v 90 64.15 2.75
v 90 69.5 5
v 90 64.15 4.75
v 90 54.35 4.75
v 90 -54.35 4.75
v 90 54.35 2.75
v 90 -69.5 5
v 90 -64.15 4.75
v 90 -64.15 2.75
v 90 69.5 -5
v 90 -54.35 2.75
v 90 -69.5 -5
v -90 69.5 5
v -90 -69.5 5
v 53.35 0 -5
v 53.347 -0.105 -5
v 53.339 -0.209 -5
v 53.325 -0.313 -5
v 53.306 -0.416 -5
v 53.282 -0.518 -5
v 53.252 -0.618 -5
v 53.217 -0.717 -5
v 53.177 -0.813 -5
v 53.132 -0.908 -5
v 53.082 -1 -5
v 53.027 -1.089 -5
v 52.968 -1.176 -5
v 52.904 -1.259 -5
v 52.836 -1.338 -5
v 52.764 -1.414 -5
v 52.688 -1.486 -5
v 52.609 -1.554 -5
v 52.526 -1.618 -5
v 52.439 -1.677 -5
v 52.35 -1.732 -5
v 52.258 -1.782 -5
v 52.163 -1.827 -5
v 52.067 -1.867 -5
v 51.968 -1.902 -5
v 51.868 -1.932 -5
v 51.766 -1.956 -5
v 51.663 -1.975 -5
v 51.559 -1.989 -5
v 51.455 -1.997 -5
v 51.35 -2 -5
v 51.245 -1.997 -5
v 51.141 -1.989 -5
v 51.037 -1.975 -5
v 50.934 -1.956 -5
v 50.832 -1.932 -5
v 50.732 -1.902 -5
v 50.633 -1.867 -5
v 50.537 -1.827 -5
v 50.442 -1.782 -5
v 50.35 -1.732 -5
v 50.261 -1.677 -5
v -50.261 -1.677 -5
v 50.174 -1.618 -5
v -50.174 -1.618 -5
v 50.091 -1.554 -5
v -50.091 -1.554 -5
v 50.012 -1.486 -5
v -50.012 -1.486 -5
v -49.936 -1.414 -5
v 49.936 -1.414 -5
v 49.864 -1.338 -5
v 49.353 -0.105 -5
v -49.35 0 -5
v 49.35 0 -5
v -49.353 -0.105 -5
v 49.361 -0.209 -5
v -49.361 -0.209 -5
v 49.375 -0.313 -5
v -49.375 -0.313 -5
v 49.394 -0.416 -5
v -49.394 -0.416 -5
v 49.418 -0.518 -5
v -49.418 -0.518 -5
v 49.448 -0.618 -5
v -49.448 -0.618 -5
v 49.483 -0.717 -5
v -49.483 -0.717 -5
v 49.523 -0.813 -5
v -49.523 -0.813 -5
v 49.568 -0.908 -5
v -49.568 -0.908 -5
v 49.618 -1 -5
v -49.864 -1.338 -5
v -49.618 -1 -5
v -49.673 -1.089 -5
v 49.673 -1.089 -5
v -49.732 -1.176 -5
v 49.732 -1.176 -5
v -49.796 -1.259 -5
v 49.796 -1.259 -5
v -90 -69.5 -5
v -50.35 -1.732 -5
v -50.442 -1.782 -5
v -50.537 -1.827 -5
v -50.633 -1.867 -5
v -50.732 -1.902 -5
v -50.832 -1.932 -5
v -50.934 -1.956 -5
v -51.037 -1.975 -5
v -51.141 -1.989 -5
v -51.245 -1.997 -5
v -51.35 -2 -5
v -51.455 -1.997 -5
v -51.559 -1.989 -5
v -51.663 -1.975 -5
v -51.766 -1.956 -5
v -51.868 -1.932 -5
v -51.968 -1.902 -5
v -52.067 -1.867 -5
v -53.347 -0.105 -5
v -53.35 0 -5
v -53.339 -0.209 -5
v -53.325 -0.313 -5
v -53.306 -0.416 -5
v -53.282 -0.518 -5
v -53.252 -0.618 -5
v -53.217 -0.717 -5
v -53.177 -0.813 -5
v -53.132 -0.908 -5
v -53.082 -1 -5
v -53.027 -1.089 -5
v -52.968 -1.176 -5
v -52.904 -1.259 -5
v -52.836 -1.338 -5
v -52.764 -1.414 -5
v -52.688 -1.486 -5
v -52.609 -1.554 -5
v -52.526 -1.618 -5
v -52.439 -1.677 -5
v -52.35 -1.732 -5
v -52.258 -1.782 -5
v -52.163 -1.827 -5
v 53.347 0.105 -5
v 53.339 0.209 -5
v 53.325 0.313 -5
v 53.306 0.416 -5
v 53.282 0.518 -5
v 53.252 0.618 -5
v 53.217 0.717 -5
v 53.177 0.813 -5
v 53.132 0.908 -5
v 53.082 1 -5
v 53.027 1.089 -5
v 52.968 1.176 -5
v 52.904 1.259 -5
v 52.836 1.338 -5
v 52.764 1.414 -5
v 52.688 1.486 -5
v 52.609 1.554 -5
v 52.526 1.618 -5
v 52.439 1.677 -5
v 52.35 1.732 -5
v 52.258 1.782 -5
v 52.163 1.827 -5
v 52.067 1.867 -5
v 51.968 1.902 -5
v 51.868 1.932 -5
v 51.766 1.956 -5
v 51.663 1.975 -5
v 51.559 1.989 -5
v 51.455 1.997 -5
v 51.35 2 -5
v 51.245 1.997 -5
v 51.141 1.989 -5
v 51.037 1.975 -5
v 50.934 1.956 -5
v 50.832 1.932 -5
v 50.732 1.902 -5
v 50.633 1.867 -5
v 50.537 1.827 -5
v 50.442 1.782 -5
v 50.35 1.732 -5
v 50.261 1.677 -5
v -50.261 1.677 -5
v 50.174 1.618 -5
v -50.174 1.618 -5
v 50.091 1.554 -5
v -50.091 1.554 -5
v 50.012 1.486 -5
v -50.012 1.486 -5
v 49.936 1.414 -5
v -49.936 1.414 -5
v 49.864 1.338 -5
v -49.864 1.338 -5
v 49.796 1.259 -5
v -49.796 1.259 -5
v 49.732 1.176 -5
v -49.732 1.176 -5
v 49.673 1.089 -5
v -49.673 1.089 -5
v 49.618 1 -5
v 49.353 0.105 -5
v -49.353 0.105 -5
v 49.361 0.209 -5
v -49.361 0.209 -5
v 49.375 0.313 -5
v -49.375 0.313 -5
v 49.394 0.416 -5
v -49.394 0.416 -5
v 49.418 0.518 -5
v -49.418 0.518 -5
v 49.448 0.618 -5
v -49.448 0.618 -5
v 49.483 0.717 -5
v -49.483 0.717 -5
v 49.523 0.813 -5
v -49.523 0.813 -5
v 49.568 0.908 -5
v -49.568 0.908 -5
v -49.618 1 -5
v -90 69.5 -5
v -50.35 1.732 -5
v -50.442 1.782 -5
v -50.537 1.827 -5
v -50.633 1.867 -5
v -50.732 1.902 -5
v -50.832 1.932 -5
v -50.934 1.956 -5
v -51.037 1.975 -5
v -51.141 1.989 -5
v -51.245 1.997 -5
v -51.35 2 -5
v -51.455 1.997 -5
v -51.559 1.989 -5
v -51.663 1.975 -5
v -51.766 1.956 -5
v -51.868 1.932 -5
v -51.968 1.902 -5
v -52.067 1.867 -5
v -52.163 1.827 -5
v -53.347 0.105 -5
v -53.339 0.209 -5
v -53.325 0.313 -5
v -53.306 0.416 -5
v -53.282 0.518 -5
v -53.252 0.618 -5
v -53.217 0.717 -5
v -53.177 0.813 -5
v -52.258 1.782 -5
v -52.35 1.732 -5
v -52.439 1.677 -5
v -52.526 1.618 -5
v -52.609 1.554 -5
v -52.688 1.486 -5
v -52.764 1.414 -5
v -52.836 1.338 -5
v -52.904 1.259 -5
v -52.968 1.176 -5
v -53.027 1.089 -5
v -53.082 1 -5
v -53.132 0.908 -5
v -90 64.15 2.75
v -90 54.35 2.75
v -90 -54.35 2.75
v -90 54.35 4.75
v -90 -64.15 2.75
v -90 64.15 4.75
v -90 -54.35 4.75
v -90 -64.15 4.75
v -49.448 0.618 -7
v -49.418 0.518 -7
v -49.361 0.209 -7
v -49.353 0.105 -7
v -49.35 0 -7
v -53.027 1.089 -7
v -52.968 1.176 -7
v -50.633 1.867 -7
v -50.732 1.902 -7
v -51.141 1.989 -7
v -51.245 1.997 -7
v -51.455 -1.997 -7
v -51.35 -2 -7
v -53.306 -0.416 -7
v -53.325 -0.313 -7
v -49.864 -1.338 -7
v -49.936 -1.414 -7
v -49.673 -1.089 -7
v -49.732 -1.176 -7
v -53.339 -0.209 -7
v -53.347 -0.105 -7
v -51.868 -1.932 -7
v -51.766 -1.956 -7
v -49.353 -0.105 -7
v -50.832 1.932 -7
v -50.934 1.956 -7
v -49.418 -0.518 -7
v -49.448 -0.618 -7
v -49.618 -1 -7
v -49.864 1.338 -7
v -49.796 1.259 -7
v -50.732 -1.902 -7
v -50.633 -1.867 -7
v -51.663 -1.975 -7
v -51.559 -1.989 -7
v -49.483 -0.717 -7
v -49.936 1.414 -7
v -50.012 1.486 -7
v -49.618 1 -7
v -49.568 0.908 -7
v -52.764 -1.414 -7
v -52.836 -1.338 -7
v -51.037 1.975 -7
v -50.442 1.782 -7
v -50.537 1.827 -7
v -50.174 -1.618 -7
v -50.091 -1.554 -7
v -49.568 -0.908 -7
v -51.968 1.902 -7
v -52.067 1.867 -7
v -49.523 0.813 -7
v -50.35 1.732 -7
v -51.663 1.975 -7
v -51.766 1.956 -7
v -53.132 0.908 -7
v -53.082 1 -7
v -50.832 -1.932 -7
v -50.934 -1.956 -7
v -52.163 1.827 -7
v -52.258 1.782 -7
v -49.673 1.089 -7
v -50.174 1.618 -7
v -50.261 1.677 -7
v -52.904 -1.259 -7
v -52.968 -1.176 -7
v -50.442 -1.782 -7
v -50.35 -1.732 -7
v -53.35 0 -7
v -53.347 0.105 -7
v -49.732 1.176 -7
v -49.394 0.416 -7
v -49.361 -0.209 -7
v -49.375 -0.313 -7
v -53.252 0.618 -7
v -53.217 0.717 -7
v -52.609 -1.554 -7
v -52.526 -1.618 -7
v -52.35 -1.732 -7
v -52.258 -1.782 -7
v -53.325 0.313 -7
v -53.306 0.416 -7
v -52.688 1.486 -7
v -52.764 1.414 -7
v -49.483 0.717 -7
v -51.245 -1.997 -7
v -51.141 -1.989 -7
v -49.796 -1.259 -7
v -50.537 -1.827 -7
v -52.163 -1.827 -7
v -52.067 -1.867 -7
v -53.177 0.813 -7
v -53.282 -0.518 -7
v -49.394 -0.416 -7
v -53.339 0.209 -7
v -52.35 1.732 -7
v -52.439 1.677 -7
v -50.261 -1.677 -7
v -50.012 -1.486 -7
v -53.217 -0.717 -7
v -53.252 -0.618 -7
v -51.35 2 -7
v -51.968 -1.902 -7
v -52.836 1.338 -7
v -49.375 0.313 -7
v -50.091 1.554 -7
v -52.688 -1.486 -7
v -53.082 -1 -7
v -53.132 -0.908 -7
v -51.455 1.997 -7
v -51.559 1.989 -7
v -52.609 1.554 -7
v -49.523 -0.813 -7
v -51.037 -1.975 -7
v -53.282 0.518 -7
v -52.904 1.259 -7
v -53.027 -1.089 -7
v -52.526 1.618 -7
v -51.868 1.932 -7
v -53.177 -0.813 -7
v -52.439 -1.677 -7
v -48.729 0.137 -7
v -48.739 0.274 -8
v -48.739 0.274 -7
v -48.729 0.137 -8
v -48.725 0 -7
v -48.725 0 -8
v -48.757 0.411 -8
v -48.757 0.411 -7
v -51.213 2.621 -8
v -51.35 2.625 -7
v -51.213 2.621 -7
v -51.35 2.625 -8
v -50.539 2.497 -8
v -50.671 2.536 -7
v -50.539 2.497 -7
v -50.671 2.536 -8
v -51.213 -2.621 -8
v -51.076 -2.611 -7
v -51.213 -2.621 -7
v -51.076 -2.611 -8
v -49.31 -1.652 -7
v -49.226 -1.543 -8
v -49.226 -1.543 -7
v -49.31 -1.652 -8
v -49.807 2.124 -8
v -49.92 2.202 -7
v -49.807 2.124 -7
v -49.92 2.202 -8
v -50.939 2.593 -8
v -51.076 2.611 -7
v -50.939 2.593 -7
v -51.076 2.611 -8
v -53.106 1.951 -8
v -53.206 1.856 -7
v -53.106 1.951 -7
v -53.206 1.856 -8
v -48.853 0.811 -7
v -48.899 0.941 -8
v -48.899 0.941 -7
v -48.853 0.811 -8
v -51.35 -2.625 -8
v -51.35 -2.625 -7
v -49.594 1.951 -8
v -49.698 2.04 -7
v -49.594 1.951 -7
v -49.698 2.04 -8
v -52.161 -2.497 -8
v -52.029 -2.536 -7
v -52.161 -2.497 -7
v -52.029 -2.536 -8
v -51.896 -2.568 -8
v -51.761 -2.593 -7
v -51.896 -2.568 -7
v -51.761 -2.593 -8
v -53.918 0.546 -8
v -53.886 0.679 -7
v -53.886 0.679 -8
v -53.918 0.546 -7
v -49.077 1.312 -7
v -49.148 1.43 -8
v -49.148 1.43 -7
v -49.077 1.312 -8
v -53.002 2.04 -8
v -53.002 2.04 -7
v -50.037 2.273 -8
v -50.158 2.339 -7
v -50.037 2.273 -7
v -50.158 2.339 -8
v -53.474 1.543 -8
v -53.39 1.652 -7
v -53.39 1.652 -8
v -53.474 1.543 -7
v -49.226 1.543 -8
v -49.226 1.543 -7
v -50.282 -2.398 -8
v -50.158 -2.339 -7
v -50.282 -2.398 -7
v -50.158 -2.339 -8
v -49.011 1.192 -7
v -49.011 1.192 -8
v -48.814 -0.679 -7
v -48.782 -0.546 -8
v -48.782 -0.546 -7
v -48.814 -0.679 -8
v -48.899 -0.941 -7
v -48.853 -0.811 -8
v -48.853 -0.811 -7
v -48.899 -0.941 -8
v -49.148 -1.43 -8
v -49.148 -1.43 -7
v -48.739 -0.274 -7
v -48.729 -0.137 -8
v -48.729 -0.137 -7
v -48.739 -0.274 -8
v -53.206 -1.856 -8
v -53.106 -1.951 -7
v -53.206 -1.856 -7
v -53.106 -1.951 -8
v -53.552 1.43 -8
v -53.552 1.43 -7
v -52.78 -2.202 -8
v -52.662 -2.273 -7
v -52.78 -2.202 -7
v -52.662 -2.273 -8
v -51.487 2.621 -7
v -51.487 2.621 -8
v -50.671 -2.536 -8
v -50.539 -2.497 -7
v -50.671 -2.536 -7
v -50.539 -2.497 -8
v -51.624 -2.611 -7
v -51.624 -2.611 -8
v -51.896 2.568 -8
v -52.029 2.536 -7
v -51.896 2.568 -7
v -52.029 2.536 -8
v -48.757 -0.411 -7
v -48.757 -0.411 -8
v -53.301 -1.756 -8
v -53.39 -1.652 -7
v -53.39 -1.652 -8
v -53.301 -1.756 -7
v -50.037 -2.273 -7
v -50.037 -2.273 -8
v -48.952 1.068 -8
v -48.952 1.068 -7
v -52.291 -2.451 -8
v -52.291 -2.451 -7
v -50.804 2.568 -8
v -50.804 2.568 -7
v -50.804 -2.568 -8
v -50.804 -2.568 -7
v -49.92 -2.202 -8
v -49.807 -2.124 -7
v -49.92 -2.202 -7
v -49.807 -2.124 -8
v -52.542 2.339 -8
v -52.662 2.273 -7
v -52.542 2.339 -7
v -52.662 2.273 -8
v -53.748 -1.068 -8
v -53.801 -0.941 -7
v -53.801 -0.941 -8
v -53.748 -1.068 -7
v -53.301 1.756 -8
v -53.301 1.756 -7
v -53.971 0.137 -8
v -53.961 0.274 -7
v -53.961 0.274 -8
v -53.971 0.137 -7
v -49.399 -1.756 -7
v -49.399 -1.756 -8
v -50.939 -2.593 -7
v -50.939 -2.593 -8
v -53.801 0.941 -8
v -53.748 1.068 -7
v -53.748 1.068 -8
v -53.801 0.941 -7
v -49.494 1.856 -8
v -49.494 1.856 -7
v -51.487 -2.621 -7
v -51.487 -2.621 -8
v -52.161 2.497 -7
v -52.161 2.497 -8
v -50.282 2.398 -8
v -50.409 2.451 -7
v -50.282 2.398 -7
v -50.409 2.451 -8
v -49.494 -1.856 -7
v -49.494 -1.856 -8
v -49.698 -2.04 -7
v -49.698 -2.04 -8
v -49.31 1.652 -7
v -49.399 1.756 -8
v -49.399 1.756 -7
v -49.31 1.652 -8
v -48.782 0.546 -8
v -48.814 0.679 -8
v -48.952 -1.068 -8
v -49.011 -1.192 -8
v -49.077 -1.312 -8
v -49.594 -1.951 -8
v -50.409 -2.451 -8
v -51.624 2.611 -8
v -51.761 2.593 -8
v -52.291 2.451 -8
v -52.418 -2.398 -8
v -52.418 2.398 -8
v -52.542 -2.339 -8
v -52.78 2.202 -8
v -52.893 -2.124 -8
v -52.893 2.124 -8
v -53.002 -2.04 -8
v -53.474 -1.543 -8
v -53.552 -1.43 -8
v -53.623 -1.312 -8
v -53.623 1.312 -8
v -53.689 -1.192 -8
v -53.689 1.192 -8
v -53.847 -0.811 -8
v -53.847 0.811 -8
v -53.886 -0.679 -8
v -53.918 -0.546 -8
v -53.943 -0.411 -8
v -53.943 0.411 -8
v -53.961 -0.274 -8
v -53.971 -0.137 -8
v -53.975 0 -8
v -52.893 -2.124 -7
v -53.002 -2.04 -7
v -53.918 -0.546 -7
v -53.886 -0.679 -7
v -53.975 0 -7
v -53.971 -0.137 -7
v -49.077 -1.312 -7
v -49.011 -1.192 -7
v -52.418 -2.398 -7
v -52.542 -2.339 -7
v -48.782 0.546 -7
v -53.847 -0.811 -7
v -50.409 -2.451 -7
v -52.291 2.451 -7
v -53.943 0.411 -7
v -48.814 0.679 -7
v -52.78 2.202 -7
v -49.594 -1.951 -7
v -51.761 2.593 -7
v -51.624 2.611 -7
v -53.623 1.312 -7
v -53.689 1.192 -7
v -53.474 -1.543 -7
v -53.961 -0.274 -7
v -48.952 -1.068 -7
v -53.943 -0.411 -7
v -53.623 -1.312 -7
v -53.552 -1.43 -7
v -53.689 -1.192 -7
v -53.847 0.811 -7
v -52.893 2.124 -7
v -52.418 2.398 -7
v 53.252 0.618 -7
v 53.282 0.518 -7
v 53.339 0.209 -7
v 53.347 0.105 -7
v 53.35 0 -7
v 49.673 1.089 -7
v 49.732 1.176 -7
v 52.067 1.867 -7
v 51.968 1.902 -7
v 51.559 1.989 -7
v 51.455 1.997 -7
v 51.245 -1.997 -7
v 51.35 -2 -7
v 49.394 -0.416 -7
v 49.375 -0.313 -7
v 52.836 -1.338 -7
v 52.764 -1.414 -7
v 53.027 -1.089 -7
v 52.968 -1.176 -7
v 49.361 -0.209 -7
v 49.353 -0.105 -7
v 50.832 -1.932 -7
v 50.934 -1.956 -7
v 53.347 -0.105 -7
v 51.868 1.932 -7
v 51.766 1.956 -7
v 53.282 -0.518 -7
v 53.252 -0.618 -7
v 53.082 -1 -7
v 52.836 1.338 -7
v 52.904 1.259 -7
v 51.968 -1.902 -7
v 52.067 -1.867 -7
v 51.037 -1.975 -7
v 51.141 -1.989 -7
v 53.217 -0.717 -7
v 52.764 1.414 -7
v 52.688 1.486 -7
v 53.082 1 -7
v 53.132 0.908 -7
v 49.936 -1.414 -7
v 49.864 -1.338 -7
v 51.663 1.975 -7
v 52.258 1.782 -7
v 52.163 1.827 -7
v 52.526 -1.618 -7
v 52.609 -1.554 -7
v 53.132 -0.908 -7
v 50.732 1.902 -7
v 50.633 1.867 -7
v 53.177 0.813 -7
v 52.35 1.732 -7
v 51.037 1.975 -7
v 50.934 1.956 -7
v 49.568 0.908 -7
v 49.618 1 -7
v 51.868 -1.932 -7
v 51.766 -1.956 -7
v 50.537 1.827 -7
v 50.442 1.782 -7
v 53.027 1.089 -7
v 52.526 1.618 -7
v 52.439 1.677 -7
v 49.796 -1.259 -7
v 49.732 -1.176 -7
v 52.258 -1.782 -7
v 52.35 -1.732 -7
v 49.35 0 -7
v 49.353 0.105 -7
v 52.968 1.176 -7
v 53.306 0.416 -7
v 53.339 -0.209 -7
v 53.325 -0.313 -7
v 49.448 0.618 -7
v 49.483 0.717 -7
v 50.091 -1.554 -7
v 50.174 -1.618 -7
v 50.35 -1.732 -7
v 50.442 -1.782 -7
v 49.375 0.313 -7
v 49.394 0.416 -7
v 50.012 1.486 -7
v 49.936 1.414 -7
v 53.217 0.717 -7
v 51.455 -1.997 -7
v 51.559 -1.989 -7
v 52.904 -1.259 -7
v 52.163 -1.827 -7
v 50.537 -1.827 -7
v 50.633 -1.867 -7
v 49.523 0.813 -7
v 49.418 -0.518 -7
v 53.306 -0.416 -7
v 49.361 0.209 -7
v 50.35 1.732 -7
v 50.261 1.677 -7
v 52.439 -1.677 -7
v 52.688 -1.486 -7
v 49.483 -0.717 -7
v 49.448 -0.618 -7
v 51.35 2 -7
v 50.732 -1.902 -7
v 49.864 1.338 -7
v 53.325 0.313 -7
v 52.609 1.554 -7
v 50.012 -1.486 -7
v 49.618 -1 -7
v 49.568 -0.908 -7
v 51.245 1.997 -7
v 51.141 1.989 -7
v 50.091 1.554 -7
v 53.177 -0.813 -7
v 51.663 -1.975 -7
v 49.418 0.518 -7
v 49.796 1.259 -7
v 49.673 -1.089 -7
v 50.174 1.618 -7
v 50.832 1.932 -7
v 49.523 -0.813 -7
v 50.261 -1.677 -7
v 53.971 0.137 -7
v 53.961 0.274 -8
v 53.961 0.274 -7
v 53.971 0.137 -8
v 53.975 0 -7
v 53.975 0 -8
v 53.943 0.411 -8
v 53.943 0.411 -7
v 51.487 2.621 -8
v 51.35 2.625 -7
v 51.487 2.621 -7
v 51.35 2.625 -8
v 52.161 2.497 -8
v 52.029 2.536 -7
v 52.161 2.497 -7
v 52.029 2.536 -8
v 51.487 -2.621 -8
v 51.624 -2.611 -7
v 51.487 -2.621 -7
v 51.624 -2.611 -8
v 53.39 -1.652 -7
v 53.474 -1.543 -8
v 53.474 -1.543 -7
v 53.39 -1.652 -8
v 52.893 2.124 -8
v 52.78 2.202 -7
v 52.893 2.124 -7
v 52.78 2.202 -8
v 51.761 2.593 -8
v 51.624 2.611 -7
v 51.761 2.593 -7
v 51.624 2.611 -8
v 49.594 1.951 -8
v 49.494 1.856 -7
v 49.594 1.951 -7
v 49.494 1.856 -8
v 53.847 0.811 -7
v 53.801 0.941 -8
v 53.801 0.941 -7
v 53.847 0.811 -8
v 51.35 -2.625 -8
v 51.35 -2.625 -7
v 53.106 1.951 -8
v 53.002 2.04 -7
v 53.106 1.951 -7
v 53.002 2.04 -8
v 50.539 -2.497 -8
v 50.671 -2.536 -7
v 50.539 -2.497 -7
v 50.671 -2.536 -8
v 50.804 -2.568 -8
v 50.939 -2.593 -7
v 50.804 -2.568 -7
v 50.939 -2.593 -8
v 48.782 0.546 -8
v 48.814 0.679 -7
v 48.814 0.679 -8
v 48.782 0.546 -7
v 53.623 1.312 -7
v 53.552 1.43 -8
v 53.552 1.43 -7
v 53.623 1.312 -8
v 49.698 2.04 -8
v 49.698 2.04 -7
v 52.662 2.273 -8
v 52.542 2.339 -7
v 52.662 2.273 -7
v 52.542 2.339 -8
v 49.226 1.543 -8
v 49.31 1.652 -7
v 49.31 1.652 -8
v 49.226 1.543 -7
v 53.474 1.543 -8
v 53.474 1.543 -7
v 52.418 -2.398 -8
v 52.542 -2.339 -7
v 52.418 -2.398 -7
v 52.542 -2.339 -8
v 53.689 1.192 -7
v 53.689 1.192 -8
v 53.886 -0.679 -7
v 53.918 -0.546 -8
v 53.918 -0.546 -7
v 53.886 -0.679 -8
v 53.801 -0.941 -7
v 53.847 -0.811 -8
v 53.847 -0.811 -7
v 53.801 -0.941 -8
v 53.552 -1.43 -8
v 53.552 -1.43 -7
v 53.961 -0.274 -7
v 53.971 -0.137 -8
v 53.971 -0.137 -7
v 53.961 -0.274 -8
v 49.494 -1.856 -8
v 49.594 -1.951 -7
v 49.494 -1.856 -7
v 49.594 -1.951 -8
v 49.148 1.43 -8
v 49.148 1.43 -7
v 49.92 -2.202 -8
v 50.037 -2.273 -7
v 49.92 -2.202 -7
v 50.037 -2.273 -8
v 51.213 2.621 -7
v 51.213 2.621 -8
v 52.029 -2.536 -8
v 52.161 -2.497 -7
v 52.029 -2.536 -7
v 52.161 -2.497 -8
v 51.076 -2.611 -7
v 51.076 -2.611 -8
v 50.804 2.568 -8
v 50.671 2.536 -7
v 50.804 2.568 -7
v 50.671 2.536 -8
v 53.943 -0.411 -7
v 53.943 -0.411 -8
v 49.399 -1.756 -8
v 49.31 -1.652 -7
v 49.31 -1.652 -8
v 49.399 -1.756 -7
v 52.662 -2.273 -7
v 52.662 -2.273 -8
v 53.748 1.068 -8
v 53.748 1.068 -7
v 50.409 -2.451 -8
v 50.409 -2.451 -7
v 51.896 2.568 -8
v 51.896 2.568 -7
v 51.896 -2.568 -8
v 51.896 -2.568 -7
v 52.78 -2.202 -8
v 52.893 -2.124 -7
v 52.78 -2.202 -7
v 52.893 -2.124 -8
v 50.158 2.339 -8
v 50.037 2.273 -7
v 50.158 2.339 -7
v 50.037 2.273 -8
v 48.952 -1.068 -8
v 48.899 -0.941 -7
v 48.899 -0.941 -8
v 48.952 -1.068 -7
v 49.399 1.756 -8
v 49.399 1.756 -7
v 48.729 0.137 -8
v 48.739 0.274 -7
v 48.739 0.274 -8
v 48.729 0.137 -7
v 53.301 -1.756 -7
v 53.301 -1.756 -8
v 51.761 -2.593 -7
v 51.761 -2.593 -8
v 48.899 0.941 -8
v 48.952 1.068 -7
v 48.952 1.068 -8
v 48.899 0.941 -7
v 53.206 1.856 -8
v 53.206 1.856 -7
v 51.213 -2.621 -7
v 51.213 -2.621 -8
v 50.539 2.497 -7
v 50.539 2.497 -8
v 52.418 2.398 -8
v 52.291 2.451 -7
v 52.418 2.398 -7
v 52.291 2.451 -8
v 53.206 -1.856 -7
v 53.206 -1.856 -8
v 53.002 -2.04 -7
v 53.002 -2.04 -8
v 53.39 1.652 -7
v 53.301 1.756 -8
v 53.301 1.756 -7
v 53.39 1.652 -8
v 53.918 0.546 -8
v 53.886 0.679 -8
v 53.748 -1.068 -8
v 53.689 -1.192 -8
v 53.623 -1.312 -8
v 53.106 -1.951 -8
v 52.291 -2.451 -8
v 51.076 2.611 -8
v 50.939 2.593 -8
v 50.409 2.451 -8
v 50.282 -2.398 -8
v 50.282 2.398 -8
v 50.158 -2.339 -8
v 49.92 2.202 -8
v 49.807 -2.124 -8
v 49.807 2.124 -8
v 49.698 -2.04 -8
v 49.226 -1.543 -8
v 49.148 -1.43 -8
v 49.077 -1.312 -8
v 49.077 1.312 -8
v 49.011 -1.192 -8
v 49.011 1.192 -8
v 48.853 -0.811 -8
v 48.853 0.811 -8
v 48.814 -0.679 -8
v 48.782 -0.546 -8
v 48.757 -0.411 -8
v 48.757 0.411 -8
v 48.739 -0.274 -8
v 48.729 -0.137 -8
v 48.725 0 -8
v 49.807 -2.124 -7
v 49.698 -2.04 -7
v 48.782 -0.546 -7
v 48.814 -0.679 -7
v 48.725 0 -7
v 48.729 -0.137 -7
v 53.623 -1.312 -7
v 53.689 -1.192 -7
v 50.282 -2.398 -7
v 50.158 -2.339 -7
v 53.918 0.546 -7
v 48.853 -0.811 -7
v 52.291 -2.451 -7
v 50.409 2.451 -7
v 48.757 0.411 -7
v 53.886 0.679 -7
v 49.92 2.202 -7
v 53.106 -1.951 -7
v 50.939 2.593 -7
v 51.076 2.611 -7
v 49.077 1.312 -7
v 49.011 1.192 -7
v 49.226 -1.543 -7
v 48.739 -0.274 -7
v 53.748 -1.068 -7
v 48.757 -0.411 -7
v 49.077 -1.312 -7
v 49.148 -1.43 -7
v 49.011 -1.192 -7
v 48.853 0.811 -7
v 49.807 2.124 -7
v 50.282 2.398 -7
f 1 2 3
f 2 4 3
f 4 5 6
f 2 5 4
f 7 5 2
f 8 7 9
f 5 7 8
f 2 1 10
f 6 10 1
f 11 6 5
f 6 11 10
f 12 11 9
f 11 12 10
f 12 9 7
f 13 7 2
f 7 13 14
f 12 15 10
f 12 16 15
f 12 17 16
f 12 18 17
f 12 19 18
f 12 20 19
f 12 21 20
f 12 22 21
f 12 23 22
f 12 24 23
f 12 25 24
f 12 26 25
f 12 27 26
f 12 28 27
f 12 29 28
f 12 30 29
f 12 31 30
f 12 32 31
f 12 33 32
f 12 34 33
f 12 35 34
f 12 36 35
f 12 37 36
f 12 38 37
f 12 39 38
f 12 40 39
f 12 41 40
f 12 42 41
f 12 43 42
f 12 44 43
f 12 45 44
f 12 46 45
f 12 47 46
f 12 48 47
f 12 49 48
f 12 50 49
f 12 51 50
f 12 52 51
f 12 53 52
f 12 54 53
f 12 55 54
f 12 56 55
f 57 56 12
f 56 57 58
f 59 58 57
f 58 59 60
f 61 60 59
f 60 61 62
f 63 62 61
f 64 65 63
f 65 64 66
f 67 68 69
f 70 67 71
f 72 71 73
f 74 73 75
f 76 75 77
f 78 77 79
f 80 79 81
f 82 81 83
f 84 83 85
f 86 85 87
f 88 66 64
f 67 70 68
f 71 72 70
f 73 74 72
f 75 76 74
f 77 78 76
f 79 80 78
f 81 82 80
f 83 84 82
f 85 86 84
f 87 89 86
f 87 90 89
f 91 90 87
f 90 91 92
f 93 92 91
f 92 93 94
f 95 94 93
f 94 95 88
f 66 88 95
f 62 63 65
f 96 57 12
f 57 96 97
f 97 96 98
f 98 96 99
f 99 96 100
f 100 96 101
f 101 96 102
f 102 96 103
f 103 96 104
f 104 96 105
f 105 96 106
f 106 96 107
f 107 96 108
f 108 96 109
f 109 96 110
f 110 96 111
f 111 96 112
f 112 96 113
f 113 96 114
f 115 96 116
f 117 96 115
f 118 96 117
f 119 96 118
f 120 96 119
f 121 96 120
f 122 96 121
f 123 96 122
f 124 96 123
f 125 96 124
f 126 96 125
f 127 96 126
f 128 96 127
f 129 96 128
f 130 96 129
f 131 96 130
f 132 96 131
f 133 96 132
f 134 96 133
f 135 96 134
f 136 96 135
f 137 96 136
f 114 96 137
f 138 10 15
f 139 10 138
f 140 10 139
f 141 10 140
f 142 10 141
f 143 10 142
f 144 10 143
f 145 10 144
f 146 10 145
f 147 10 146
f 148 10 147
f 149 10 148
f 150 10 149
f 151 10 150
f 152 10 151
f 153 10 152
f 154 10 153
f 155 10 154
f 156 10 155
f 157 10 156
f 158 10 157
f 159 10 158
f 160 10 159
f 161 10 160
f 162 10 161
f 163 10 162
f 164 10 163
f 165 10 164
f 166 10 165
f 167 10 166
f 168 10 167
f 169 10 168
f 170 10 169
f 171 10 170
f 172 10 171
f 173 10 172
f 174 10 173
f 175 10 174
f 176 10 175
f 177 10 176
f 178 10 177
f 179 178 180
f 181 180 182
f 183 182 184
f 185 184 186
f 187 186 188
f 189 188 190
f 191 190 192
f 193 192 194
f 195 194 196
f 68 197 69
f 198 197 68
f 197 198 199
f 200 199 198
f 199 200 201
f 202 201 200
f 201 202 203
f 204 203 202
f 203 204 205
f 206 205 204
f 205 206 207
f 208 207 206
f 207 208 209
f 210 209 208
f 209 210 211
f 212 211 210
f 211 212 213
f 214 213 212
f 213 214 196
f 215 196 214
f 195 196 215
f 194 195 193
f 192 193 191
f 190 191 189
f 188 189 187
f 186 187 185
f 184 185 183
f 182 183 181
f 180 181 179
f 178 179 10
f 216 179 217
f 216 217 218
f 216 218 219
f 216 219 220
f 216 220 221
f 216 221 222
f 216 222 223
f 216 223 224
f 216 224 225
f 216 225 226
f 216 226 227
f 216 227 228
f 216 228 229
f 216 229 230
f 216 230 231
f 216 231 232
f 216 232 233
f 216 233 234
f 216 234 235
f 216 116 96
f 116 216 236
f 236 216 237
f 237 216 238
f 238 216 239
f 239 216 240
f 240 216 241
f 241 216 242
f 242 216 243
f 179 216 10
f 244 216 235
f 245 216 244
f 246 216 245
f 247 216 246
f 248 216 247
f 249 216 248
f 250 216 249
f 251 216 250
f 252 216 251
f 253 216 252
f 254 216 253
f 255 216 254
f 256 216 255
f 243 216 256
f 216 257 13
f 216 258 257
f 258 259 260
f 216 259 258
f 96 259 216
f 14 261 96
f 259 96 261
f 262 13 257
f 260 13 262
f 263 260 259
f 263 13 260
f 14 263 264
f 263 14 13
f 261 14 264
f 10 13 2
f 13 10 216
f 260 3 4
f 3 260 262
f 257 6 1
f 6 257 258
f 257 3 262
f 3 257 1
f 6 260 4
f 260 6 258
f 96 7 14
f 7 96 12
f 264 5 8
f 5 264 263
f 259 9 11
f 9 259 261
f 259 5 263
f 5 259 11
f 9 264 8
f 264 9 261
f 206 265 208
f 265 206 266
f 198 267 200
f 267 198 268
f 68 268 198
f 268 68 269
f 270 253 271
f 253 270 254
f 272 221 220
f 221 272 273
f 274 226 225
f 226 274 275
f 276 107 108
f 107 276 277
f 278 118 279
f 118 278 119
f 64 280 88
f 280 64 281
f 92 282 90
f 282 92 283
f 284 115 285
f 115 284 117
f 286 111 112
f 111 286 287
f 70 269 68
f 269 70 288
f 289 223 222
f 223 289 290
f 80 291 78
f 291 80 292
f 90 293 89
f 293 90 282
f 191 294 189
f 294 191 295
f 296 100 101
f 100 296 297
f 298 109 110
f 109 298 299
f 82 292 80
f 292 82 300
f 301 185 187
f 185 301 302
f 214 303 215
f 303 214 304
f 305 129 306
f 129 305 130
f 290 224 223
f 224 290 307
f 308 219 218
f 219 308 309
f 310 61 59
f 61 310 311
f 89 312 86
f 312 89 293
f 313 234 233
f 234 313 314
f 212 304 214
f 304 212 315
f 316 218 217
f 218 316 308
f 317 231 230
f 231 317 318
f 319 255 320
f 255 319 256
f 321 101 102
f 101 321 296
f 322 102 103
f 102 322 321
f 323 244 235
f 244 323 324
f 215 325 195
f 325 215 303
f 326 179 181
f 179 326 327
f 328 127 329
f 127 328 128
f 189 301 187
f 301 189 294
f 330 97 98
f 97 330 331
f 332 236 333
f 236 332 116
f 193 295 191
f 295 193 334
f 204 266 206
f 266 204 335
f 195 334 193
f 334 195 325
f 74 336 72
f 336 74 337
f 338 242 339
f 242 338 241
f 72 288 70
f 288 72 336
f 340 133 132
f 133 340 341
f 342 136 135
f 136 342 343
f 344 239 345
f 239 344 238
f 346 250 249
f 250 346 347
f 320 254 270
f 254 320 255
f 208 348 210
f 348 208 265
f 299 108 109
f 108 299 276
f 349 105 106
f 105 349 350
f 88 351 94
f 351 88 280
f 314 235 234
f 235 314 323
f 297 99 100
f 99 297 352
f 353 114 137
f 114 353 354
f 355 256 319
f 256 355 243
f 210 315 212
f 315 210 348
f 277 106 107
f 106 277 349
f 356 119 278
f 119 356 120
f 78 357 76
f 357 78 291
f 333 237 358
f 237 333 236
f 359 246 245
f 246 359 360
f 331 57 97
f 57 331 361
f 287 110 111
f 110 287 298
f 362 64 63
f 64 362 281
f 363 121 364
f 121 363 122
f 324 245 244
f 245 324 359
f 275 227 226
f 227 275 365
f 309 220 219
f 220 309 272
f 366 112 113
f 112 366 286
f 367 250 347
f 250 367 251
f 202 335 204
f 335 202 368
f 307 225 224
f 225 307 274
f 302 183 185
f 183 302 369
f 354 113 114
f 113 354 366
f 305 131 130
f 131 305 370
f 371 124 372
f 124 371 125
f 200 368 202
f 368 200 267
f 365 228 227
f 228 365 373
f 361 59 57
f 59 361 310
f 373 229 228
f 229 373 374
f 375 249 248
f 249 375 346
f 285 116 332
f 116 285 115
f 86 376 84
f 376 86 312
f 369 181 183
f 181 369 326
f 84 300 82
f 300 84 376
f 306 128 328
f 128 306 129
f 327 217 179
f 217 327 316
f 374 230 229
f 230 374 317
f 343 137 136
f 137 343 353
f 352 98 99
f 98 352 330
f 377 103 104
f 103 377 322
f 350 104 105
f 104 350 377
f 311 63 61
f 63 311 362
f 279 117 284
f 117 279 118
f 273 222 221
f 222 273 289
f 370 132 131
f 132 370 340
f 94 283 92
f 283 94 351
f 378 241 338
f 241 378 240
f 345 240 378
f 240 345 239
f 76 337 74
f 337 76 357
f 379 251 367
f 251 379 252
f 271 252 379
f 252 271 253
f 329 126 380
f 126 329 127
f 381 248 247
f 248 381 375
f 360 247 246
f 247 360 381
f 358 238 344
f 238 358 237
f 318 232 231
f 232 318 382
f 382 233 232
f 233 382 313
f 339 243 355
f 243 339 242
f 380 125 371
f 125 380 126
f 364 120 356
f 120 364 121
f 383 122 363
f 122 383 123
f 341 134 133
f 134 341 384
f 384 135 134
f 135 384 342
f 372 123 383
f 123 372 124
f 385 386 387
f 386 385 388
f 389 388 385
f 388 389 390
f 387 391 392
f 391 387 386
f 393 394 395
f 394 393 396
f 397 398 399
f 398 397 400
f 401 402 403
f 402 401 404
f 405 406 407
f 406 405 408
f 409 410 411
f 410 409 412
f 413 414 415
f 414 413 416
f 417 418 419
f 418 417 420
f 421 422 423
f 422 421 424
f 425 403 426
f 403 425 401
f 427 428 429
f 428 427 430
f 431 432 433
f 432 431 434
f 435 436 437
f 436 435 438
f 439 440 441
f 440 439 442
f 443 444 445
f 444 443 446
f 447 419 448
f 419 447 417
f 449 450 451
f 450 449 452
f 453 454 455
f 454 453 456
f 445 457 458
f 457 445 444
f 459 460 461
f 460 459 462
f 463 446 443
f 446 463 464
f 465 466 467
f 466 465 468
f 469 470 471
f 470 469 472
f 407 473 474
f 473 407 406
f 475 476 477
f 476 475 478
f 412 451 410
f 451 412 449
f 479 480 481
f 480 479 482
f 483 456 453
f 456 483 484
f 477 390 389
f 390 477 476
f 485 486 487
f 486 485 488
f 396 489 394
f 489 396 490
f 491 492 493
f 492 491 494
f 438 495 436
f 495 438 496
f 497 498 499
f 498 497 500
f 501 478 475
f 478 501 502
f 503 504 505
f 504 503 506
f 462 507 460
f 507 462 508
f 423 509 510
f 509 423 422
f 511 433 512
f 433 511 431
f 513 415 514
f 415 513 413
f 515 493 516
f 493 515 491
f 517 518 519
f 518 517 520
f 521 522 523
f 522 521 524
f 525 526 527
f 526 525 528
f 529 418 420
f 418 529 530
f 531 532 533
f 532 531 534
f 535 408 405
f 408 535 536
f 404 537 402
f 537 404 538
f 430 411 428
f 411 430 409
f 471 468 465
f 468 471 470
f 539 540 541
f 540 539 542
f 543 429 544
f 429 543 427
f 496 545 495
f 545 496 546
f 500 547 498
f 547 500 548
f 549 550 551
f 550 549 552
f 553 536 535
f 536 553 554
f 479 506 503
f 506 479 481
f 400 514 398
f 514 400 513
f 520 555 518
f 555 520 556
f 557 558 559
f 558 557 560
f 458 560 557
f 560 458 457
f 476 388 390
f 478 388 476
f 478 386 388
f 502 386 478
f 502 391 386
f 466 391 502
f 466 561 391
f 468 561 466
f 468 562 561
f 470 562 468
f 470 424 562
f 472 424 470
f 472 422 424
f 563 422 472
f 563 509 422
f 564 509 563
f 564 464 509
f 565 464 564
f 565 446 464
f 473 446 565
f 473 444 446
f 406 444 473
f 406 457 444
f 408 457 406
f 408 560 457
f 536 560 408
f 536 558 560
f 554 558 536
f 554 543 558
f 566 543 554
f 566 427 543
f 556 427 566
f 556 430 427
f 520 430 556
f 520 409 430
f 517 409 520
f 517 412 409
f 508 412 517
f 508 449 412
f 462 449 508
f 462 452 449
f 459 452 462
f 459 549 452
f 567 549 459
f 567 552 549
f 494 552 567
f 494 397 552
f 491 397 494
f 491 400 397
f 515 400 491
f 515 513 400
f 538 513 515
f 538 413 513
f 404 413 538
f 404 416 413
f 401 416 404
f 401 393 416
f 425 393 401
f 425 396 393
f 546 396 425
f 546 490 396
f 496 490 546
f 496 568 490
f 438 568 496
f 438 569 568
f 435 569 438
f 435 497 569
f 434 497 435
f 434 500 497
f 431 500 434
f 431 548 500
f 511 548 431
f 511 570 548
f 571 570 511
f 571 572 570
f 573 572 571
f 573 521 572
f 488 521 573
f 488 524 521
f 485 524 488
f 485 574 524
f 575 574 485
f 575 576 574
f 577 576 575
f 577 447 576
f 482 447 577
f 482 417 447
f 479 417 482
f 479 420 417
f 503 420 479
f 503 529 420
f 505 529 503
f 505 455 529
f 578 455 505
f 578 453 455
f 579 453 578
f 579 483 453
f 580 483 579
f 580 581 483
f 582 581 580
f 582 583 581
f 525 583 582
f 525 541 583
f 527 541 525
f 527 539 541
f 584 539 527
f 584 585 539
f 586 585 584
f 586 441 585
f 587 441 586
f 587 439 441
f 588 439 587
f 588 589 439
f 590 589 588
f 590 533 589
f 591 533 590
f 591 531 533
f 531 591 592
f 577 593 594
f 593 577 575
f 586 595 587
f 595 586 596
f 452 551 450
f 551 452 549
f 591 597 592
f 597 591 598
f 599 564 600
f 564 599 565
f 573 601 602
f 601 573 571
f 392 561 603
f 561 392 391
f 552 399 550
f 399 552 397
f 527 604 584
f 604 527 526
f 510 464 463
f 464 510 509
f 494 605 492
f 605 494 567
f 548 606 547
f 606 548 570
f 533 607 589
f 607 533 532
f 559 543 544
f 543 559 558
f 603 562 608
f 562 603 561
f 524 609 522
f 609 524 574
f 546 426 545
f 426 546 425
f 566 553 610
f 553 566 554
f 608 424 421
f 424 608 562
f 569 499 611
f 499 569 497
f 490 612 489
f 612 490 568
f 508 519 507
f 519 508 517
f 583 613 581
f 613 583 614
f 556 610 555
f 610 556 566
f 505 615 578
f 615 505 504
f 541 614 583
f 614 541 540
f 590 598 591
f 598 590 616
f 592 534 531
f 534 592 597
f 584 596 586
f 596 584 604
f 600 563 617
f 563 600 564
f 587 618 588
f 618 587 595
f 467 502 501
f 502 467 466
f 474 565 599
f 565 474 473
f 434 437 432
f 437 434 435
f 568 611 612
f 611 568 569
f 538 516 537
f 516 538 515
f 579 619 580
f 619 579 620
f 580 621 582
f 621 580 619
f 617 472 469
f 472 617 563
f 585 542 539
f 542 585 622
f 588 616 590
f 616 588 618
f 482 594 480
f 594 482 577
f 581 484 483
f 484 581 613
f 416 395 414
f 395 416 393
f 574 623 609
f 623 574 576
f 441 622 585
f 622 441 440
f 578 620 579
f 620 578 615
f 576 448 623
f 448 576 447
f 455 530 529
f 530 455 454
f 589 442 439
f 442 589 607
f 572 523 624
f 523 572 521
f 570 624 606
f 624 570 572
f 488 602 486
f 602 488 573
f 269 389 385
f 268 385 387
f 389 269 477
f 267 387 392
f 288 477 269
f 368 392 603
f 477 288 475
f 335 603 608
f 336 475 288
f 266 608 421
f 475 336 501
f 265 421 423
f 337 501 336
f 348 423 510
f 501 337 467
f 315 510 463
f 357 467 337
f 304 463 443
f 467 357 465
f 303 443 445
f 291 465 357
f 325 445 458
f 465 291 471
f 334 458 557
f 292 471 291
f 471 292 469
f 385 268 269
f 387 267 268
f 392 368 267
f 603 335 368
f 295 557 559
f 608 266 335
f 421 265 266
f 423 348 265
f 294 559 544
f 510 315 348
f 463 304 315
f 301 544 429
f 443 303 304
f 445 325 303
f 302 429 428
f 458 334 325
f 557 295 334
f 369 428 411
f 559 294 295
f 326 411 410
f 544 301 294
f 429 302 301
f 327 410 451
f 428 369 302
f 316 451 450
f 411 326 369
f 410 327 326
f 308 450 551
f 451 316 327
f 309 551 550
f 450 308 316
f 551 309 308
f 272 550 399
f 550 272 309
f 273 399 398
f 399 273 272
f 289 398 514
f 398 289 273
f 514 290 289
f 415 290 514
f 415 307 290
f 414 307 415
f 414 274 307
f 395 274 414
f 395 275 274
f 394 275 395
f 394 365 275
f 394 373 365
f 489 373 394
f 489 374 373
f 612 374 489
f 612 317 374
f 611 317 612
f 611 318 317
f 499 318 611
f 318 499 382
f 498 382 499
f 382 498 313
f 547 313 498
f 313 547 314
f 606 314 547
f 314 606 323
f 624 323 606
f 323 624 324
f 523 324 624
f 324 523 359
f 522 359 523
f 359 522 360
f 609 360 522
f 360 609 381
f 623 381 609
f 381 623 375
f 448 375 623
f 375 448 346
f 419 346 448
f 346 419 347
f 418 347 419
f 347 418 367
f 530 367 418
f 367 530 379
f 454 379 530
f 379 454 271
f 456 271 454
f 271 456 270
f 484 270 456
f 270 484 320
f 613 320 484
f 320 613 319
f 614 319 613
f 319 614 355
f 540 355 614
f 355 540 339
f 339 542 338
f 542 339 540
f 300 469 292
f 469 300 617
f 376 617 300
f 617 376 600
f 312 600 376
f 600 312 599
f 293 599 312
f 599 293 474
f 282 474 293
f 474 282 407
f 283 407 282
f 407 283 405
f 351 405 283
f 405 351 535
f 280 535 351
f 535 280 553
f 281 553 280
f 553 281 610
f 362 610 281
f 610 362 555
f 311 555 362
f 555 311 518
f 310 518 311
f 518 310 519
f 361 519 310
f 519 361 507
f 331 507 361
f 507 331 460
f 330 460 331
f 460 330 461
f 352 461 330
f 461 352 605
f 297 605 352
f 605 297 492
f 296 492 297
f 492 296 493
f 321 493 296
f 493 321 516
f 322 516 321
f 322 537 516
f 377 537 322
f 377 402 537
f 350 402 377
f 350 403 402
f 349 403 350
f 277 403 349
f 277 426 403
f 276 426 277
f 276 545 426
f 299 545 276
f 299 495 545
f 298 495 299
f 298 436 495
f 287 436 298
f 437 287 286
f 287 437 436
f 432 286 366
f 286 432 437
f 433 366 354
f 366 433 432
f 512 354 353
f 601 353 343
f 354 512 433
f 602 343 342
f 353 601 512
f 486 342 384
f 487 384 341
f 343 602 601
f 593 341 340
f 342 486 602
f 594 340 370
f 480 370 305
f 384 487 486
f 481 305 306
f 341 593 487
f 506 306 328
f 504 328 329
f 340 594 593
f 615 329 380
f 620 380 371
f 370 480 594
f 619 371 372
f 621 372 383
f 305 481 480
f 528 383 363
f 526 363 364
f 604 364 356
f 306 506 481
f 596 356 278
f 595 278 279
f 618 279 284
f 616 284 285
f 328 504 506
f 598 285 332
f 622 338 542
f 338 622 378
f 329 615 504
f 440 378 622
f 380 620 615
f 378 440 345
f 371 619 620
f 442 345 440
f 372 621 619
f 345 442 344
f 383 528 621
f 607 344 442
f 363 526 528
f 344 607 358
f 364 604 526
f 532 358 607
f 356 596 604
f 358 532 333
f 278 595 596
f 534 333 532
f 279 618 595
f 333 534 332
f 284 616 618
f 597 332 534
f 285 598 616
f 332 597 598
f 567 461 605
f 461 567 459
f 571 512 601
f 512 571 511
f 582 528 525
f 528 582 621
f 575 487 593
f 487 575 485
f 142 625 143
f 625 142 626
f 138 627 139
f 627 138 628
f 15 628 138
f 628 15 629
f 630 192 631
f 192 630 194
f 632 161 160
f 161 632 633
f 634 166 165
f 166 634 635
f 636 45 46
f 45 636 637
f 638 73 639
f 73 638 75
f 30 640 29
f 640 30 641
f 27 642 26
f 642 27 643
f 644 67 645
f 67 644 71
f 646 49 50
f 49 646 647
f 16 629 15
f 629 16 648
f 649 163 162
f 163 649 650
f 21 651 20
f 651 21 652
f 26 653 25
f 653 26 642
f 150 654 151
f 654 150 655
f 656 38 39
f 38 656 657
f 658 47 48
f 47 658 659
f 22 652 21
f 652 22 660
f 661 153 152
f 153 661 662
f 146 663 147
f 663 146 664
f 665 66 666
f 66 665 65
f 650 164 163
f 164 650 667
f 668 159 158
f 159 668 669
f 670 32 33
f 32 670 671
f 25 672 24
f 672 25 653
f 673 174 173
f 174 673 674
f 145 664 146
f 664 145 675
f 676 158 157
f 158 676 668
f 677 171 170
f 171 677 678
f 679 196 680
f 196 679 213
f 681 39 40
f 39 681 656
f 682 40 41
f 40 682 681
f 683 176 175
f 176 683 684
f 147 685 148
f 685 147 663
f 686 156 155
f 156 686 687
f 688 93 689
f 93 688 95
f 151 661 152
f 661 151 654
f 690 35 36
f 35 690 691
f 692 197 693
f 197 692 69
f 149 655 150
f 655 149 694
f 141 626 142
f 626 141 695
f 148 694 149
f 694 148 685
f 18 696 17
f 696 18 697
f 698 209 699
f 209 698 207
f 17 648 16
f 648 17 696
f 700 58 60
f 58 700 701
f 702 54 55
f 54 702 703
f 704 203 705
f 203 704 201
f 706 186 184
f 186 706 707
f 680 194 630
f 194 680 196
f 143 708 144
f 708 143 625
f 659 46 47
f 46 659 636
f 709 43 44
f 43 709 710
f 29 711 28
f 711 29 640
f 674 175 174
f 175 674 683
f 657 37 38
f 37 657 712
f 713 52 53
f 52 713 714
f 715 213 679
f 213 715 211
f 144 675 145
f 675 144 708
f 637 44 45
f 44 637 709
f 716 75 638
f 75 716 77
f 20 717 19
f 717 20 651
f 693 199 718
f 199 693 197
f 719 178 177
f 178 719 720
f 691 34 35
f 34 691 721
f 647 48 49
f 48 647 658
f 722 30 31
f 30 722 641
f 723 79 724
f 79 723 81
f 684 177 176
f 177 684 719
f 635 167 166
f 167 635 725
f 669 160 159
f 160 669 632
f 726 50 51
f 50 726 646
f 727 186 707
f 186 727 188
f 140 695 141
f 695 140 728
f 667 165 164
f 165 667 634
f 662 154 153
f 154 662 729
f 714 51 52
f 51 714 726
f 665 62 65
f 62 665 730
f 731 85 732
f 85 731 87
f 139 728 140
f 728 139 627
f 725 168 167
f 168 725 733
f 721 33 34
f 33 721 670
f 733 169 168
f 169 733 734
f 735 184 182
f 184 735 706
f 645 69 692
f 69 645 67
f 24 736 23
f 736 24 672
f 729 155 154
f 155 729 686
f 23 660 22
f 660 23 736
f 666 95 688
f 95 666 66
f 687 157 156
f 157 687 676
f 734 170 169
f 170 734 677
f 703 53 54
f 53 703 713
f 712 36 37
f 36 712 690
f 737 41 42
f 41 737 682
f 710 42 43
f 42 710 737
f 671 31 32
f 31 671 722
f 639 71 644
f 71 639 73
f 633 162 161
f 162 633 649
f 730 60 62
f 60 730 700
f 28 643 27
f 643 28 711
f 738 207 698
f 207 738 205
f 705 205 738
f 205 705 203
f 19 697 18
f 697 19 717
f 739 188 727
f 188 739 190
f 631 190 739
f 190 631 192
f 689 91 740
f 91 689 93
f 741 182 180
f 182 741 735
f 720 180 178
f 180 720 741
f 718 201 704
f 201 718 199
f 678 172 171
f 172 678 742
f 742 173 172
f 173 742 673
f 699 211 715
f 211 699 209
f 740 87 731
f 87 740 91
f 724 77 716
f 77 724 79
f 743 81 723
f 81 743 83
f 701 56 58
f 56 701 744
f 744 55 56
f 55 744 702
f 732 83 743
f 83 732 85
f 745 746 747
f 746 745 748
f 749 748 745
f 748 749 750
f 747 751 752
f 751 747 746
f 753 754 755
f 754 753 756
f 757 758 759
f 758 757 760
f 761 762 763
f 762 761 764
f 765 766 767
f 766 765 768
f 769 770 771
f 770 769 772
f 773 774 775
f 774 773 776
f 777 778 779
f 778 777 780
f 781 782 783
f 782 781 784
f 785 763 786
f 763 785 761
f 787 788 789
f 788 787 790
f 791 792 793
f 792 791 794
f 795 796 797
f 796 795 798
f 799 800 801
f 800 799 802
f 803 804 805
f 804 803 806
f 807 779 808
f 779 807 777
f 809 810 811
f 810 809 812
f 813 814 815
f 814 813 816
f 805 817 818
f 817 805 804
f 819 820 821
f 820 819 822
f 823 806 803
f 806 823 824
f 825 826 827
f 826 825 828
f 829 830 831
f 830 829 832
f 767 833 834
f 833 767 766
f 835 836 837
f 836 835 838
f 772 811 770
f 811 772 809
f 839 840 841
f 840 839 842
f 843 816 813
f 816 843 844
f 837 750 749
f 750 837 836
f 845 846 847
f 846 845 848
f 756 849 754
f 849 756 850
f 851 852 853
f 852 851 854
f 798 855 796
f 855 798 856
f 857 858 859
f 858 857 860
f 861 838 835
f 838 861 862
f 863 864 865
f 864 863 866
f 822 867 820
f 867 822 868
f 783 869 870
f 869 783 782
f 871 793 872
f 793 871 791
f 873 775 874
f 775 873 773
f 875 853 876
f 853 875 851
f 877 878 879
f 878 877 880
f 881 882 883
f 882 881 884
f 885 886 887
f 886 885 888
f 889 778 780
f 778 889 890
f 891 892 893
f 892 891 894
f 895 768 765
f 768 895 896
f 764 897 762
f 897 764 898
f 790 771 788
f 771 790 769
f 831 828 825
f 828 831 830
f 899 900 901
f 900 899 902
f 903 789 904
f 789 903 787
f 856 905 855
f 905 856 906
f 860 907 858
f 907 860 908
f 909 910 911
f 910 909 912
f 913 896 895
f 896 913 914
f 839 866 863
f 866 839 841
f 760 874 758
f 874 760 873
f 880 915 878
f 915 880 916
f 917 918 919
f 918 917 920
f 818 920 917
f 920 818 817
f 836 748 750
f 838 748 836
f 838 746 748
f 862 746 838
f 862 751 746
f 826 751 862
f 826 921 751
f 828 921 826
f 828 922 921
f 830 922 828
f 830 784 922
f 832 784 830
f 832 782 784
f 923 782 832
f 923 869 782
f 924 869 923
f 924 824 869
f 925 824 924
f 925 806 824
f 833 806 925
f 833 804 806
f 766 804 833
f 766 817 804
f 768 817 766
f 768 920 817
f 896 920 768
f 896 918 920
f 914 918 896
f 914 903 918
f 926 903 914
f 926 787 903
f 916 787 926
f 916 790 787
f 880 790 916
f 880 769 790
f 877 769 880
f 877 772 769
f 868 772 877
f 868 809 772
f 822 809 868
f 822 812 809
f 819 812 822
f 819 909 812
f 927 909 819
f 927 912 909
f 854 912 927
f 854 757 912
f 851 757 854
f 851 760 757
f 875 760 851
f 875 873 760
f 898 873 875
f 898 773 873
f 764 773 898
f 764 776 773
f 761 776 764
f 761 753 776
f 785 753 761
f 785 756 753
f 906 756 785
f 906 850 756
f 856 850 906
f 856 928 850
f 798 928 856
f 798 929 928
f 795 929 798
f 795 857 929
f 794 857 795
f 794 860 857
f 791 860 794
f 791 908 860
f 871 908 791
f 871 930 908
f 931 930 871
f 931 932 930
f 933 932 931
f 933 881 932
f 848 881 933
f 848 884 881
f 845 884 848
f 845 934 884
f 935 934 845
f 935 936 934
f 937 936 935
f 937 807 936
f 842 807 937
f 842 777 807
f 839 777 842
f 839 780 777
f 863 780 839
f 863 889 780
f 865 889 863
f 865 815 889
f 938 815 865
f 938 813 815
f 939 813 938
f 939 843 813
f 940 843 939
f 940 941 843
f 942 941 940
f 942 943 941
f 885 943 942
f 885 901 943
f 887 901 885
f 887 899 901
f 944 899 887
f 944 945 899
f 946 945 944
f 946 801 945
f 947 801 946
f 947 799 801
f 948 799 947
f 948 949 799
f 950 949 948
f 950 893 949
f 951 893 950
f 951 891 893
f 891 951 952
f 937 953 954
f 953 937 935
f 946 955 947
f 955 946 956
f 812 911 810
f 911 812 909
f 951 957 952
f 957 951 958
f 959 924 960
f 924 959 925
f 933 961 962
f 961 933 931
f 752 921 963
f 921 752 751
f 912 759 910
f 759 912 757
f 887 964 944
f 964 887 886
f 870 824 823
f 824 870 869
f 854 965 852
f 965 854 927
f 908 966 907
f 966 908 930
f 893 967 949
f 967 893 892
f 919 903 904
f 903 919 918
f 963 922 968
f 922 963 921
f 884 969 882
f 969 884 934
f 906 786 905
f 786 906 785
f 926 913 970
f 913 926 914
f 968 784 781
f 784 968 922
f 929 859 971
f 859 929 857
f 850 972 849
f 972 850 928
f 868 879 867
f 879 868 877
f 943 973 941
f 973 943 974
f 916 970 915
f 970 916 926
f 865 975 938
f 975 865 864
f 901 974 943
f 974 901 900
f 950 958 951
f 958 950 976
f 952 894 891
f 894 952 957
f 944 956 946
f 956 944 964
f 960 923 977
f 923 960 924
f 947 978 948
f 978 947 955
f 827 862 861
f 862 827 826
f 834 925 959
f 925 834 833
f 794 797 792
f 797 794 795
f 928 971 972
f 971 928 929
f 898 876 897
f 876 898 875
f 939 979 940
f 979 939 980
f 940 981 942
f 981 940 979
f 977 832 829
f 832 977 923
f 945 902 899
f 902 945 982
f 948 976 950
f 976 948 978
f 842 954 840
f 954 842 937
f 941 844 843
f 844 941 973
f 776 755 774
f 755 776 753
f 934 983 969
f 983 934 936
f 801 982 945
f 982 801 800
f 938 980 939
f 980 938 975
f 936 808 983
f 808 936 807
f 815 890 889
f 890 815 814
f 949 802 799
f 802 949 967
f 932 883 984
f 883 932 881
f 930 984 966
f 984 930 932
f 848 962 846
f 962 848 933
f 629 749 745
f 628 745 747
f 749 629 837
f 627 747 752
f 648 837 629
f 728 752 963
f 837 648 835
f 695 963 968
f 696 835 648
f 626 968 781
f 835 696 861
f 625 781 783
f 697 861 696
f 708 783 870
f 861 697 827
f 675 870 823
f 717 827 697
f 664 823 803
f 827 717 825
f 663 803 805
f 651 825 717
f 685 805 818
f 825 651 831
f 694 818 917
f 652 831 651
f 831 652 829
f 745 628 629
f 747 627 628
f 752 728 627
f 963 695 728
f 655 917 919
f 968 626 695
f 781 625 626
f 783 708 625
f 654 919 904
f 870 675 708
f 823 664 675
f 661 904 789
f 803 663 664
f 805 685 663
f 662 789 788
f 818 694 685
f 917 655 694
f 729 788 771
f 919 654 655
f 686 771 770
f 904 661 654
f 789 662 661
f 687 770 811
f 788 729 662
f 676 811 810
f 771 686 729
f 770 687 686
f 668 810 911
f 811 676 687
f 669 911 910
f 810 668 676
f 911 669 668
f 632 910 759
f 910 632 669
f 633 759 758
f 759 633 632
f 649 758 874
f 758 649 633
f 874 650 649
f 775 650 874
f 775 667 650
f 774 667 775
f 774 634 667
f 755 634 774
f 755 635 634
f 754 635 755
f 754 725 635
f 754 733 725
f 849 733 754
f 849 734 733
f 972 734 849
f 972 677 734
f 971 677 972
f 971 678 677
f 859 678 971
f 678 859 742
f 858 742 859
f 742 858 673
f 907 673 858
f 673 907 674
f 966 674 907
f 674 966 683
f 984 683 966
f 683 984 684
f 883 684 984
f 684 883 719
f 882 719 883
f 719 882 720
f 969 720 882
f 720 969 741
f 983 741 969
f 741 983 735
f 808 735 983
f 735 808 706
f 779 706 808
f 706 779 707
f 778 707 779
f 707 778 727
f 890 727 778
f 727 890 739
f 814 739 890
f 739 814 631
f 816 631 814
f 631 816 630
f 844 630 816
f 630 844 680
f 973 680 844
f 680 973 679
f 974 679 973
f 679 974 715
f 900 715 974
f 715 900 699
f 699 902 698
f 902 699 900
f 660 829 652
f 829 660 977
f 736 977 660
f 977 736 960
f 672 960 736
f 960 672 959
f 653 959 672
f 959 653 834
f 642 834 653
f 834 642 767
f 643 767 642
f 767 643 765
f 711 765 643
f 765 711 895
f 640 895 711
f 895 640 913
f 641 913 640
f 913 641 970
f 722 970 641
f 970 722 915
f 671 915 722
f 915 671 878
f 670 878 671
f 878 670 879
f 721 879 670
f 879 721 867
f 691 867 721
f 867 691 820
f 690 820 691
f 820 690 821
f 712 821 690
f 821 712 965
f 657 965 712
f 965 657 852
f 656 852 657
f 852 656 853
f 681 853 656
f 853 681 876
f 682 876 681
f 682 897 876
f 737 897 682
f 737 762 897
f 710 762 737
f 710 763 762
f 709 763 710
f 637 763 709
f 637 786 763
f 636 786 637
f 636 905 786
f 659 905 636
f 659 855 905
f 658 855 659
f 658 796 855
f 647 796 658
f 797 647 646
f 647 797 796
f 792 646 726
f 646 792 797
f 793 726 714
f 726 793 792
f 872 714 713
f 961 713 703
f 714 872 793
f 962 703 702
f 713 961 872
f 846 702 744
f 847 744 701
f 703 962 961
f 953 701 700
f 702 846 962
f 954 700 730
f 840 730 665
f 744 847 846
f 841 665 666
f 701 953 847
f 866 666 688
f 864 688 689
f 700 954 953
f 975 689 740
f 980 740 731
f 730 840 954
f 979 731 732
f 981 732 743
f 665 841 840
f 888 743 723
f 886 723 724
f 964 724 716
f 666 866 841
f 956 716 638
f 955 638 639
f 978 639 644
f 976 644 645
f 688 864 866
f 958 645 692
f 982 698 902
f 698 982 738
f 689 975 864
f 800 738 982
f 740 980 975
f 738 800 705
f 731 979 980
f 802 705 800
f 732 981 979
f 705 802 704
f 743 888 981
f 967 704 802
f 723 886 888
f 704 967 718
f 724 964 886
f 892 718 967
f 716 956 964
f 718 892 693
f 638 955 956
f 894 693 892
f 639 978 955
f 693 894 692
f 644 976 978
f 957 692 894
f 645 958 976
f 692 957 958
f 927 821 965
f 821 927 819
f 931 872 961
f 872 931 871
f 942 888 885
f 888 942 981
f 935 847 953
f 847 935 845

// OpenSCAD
$fn = 120;
length = 180;
thickness = 10;
rail_width = 20.5;
rail_gap = 98;
ps_mount_hole_gap = 102.7;
ps_mount_hole_head = 5.25;
ps_mount_hole_thread = 4;
ps_mount_hole_depth = 2.5;
magnet_width = 9.8;
magnet_length = 20.3;
magnet_depth = 2;

union() {
  cube([length, rail_gap, thickness], center=true);
  translate([0, rail_width/2+rail_gap/2, 0]) {
    rail();
  }
  translate([0, -rail_width/2-rail_gap/2, 0]) {
    rail();
  }
  
  translate([-ps_mount_hole_gap/2, 0, -thickness/2])
  hook();

  translate([ps_mount_hole_gap/2, 0, -thickness/2])
  hook();
}


module rail() {
  color("red")
  difference() {
    cube([length, rail_width, thickness], center=true);
    translate([0, 0, thickness/2-magnet_depth/2-0.25])
      cube([length, magnet_width, magnet_depth], center=true);
  }
}

module hook() {
  color("blue")
  translate([0, 0, -ps_mount_hole_depth/2])
  union() {
    //thread
    cylinder(h=ps_mount_hole_depth, d=ps_mount_hole_thread, center=true);
    //head
    translate([0, 0, -ps_mount_hole_depth/2])
    cylinder(h=1, d=ps_mount_hole_head, center=true);
  }
}
